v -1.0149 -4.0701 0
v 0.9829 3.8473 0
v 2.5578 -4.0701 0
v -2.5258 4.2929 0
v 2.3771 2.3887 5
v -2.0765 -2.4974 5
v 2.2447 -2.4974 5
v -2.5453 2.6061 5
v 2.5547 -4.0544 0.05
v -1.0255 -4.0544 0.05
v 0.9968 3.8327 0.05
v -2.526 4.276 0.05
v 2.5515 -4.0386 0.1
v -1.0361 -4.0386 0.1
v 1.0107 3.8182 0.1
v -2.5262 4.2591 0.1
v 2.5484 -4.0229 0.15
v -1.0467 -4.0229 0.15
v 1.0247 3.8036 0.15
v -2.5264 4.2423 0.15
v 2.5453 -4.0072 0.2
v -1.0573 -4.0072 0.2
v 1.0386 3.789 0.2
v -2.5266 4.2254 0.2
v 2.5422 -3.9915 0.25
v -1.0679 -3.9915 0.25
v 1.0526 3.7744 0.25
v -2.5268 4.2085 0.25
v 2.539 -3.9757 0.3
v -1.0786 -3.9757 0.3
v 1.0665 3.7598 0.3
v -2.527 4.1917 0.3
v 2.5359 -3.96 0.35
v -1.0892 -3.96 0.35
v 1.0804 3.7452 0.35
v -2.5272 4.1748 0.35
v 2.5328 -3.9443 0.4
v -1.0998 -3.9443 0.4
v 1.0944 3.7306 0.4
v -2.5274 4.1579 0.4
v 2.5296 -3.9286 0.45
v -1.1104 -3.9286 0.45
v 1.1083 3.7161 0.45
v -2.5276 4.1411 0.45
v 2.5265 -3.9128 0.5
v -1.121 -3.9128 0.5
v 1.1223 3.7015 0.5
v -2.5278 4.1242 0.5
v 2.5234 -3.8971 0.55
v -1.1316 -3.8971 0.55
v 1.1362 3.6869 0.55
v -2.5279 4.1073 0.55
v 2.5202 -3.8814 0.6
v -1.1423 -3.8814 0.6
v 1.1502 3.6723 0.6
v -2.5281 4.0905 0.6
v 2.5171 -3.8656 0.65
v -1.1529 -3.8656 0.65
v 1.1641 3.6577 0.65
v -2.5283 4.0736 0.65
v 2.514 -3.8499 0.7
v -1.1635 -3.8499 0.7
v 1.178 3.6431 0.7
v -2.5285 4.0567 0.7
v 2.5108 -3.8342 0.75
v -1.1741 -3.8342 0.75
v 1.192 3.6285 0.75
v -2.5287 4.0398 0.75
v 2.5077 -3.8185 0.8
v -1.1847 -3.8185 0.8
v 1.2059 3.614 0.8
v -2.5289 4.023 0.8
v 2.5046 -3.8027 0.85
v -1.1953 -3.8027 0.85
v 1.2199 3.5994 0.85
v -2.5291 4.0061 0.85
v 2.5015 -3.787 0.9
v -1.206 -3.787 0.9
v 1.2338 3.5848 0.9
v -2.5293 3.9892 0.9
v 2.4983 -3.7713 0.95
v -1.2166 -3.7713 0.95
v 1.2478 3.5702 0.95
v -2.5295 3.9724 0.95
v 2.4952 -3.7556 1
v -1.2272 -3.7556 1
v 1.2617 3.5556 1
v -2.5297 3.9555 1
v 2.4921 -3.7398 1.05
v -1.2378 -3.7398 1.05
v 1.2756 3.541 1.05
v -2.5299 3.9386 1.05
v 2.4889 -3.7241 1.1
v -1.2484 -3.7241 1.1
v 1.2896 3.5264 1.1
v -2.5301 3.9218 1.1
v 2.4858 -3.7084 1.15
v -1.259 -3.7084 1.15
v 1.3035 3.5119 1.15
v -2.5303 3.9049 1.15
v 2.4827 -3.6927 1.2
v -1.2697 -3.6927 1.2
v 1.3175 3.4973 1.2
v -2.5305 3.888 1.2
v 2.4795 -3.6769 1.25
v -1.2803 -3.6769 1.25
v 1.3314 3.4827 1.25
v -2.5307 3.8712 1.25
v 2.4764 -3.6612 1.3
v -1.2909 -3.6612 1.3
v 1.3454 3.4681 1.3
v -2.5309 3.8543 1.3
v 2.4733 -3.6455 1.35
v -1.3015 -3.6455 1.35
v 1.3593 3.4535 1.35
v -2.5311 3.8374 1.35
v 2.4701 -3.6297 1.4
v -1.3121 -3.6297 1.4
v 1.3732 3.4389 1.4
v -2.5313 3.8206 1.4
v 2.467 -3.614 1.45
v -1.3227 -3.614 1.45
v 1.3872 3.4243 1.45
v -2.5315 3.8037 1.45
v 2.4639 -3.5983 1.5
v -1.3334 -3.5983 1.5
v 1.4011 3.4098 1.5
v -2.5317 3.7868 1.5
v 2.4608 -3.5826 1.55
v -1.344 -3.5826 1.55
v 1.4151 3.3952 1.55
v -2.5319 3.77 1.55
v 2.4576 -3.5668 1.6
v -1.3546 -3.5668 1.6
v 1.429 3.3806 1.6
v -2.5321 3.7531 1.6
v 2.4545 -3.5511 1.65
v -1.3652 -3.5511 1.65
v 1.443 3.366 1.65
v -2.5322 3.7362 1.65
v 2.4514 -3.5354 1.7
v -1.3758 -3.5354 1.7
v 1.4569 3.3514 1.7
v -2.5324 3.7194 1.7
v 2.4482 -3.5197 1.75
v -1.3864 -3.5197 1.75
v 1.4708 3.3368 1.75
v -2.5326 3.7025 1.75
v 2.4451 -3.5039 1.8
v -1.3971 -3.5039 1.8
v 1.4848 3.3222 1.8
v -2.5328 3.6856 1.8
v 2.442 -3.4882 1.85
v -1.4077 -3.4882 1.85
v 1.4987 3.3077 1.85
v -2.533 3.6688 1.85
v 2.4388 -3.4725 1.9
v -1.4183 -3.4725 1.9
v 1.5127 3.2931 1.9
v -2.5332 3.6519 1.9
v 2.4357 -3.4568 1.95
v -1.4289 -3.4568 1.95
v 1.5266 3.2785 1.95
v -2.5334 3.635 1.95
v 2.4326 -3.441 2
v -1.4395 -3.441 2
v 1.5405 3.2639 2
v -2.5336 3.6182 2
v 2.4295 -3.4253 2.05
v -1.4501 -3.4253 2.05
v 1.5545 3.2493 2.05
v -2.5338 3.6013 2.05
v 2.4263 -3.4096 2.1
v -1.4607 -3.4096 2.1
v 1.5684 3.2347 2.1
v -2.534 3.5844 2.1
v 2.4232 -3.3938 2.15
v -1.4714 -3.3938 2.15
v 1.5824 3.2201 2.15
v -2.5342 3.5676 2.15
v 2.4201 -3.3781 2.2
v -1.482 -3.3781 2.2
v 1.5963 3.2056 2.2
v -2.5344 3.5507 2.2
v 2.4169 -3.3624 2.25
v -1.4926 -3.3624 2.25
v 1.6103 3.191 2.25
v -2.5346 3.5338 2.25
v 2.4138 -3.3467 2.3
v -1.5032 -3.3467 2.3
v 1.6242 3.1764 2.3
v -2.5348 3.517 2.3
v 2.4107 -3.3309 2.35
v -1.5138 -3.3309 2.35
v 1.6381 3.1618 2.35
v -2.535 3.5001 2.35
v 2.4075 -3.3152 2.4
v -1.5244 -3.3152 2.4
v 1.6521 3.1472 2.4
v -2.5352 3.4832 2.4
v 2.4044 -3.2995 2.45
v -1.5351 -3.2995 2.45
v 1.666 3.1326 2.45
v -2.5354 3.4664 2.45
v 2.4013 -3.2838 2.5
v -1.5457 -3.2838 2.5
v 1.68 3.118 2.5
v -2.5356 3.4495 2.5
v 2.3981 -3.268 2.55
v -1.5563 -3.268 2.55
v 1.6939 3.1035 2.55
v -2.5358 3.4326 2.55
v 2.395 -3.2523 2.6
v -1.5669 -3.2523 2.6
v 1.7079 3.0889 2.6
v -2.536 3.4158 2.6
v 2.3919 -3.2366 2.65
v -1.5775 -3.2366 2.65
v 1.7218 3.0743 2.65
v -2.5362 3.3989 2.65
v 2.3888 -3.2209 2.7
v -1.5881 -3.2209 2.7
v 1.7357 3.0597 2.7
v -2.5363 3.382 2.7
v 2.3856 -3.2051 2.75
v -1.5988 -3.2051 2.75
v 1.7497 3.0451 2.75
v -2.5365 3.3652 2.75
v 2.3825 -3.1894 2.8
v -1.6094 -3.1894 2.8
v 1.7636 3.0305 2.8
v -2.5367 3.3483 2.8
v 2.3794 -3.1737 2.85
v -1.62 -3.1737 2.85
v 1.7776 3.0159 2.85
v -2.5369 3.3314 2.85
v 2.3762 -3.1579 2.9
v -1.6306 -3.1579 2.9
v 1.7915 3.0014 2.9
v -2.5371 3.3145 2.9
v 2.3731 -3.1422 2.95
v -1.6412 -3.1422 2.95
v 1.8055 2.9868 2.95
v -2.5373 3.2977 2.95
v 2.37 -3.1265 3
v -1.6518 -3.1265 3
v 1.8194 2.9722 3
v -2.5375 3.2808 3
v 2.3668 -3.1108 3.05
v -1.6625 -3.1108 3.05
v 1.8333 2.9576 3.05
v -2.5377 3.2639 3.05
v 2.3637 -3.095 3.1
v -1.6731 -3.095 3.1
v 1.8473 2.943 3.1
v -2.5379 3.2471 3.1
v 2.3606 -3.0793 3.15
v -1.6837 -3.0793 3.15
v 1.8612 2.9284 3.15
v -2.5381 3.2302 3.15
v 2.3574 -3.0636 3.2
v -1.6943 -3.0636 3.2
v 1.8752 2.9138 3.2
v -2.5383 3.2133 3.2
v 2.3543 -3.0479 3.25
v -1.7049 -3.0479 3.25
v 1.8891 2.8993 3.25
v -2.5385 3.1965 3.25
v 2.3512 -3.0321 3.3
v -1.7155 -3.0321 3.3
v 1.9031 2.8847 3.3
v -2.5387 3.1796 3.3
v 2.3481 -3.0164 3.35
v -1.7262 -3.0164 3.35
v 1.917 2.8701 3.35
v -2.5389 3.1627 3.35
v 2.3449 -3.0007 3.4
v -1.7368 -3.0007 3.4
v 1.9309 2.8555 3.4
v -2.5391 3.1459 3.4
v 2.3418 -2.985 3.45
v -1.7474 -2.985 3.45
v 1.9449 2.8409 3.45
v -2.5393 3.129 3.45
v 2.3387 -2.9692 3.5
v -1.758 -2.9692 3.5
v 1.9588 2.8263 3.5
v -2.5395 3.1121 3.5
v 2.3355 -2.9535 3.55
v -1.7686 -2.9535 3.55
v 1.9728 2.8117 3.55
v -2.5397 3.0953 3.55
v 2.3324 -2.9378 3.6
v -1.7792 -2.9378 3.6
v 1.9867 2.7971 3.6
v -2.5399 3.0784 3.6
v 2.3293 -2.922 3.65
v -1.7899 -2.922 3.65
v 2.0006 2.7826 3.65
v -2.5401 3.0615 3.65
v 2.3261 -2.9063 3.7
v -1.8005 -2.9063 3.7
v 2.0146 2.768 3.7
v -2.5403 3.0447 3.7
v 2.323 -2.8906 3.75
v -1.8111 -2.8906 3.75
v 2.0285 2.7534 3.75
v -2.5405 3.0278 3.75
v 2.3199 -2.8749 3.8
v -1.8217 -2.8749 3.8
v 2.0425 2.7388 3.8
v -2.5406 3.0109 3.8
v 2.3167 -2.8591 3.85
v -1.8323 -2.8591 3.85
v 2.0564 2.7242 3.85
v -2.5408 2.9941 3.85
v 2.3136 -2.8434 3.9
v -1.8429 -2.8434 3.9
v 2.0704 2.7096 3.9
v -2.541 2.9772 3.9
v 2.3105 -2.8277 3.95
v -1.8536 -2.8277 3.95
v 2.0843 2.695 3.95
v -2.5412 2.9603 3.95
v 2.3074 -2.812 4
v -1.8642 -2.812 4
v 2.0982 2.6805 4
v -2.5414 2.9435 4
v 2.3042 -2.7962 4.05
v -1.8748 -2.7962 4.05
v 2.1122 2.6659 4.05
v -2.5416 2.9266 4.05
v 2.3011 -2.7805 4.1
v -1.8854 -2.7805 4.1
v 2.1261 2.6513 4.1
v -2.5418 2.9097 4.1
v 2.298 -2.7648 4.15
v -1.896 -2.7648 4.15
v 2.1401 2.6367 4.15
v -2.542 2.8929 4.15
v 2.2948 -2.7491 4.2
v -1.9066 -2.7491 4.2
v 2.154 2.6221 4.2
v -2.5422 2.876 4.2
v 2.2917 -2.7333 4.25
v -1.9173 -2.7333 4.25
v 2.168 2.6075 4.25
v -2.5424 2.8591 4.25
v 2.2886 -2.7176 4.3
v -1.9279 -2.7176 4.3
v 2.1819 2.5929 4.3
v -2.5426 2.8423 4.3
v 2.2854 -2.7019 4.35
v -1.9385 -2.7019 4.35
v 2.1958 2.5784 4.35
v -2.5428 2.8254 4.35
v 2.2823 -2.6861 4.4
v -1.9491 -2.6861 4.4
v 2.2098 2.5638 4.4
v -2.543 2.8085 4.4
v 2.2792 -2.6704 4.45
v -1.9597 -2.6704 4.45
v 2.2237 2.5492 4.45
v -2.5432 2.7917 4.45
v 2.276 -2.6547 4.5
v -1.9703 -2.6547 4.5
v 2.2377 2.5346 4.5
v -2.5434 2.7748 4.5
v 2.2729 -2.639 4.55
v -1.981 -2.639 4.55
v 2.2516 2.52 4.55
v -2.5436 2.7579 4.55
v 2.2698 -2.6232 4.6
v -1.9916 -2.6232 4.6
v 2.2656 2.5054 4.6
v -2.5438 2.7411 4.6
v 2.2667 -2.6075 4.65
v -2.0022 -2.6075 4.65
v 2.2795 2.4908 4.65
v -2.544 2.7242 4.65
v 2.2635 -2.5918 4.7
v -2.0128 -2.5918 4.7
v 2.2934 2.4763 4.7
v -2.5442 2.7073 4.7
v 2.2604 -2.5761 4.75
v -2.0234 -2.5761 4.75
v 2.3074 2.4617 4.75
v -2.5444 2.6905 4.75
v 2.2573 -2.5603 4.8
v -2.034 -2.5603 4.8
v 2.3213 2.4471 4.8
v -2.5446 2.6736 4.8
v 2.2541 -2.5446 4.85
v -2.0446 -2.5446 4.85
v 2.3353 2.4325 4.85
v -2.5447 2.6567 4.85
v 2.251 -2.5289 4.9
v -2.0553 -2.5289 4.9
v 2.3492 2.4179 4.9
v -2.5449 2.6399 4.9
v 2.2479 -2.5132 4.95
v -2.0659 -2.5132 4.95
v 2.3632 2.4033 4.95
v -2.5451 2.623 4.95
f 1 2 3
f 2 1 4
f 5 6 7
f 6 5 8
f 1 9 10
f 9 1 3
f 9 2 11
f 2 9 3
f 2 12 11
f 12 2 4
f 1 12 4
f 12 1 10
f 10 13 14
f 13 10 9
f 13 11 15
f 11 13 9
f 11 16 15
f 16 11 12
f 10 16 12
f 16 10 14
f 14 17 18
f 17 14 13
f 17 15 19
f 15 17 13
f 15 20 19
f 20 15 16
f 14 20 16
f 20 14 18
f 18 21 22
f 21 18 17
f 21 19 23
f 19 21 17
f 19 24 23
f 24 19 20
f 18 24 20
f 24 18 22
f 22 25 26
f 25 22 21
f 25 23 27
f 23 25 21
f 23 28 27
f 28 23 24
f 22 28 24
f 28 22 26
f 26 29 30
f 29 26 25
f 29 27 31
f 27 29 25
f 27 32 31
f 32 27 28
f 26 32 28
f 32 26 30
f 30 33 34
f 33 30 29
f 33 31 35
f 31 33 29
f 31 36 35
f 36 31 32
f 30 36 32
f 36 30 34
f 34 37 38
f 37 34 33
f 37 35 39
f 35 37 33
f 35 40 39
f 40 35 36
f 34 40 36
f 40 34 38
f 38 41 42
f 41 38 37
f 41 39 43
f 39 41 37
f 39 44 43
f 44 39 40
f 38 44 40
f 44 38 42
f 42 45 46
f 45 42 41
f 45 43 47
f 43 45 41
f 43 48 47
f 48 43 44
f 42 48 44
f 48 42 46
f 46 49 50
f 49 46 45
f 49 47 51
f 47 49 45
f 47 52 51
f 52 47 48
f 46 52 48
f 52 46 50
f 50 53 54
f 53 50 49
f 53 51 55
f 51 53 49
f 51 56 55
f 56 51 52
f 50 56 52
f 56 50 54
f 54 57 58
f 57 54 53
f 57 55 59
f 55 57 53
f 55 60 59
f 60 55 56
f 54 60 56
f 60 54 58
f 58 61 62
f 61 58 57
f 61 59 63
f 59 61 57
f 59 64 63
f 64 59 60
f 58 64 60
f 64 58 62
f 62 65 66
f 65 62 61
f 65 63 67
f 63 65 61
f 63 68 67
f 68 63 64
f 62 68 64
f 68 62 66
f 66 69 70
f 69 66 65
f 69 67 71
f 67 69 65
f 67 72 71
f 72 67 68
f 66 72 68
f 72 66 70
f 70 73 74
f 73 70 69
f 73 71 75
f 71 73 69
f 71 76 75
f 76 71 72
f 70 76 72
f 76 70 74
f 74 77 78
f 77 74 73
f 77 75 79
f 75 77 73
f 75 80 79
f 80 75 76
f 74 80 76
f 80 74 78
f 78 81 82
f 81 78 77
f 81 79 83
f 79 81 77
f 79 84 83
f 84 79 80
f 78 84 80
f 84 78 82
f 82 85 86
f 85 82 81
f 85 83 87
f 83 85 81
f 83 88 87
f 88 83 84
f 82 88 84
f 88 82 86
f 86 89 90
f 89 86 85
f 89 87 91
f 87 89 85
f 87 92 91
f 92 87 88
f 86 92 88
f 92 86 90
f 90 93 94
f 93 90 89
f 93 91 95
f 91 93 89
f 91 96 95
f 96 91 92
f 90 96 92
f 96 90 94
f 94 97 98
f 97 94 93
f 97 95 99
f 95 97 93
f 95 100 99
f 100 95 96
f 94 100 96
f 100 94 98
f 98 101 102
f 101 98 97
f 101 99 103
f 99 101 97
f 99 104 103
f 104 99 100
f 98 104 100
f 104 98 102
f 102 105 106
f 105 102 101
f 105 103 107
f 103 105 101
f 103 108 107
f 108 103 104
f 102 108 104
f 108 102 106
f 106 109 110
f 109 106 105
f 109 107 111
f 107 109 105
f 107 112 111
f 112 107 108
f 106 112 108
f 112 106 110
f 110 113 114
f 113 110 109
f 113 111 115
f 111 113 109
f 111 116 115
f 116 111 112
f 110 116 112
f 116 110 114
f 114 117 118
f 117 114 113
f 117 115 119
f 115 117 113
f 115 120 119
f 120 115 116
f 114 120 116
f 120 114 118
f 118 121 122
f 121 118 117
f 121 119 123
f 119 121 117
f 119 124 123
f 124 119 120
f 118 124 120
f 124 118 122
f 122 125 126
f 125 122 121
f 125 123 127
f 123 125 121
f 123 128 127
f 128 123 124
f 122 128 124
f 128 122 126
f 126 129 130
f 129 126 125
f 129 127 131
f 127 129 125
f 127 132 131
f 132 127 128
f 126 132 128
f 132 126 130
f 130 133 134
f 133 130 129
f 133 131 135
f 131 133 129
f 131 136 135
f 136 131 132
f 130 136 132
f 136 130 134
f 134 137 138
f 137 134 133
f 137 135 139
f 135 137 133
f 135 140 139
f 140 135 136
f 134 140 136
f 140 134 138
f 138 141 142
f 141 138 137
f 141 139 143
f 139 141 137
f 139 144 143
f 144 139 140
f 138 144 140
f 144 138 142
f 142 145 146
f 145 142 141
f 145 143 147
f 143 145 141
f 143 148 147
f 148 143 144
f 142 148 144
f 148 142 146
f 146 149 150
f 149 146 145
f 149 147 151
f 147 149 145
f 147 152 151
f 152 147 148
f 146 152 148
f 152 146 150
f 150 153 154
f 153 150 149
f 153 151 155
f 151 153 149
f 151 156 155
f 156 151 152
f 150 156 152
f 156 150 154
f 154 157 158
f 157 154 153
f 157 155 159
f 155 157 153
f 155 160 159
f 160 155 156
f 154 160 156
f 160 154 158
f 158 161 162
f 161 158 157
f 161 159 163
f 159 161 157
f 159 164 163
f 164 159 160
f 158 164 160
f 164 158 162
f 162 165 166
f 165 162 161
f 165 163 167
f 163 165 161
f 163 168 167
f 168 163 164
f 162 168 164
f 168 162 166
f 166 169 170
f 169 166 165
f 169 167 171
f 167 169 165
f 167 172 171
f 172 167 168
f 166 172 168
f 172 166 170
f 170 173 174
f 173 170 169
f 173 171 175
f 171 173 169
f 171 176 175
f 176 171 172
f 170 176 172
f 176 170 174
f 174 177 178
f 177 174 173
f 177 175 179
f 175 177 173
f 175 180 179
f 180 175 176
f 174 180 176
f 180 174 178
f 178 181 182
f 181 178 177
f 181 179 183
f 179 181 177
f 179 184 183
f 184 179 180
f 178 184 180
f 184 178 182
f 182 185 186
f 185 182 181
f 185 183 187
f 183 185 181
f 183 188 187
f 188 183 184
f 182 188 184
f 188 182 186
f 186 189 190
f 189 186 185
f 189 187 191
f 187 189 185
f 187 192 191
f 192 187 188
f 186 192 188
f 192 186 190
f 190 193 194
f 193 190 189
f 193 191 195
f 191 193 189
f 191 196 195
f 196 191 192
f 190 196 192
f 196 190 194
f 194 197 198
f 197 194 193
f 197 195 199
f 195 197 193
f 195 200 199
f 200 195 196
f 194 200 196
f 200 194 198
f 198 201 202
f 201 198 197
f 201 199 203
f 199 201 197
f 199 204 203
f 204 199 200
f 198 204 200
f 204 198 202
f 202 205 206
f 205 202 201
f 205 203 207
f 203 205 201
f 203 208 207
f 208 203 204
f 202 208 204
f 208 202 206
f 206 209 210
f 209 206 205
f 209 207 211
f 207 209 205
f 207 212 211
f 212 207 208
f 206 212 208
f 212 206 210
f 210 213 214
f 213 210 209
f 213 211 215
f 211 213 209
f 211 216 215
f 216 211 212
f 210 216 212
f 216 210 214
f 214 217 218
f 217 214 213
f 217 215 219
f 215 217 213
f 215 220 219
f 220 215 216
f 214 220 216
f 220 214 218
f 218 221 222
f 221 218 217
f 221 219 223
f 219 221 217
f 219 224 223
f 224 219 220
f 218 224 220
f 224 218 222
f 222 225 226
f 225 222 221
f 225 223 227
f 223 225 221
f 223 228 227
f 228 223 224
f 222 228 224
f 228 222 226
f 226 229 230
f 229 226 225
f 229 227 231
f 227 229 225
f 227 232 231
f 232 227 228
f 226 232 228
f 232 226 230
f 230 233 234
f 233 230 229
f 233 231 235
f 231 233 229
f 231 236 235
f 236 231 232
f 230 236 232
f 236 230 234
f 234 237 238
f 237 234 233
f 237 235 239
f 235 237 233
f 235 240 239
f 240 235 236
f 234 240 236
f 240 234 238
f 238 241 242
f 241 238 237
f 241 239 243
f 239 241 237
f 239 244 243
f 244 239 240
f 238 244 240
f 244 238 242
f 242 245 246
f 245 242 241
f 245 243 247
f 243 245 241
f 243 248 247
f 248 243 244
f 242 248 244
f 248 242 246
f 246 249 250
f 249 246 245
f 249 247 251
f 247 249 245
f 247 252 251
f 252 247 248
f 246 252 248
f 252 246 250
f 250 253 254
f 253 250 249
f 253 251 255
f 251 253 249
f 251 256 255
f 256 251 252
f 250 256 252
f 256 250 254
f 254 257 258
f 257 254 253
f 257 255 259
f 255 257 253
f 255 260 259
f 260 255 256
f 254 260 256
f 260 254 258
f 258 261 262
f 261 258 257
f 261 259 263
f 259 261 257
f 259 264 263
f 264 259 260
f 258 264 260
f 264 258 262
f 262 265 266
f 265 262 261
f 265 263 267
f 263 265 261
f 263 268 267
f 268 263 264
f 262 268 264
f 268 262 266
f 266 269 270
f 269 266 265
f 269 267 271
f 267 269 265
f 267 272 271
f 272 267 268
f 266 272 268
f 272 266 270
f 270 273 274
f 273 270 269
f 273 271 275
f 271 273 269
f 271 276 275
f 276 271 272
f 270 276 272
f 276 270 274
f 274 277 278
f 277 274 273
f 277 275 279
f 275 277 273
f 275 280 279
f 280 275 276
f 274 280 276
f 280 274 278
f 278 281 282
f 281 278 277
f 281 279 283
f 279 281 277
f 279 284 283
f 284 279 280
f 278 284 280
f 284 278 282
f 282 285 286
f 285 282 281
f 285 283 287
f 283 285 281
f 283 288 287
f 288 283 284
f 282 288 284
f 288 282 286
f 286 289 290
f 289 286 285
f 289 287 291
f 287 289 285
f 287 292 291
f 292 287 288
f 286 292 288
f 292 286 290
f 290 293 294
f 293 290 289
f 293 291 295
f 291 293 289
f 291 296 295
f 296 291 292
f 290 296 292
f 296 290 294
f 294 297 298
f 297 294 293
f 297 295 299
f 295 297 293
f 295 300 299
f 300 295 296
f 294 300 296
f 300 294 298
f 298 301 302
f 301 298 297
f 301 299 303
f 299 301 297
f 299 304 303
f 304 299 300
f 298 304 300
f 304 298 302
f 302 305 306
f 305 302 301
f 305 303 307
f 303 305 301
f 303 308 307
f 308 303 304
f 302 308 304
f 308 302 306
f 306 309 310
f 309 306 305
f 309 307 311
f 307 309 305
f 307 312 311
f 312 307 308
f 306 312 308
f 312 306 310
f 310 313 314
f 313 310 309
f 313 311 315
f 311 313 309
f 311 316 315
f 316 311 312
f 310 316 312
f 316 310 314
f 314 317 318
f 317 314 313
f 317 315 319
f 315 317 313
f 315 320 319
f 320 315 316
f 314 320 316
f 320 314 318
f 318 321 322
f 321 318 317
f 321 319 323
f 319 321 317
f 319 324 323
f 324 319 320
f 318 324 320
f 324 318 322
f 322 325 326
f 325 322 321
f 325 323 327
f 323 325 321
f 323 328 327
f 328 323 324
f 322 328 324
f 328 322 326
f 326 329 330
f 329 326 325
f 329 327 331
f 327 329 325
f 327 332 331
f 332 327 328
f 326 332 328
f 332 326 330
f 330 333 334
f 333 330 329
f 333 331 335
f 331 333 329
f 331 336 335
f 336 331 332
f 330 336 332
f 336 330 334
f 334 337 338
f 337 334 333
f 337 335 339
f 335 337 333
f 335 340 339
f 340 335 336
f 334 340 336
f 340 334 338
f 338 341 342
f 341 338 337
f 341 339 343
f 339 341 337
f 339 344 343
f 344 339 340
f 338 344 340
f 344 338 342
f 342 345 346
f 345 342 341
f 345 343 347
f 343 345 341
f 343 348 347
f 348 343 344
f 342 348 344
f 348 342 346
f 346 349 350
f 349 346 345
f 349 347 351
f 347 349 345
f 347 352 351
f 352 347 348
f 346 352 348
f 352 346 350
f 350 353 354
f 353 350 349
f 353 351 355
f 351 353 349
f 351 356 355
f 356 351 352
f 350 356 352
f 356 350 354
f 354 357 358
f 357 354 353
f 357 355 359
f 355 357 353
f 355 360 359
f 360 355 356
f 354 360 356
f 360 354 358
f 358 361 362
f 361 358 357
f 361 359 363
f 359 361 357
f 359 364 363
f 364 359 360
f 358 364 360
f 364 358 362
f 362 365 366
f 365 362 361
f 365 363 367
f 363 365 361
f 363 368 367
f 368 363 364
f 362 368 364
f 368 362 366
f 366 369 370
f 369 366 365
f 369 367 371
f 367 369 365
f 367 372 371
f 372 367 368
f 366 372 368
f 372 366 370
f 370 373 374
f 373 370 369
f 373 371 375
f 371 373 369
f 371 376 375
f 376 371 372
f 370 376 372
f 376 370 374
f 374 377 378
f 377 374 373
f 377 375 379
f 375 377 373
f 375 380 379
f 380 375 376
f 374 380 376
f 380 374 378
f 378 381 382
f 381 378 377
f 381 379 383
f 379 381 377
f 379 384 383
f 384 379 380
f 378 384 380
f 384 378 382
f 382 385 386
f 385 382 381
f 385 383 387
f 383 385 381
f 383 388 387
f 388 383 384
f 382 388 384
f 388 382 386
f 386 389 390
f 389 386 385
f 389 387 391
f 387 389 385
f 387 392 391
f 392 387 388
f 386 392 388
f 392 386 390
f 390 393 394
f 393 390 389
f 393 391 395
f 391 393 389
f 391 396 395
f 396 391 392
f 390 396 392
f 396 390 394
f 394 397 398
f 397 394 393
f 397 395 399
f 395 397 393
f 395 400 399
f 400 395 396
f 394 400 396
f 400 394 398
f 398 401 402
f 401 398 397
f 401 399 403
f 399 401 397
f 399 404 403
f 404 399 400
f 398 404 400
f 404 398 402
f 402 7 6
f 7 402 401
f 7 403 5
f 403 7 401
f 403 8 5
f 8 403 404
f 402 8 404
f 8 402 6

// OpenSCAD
//  kit wallace random twisted frustrum
// - handle pent to hex transition - just double one of the pentagon points and interpolate
// create mid layer with extra point  ??
// todo - tilt top face 
// todo  - copy one face to the next version - ie the first side of both is given, not random
// also the relative orientation is given

// number of sides 
n=4;
// minimum length of side
min_length=3;
// maximum length of side
max_length=10;
// angle range
angle_range=30;
// height of frustrum
height=5;
//scale upper layer pc
upper_pc=90;
// layers
m=100;


// basic functions
function flatten(l) = [ for (a = l) for (b = a) b ] ;
function between(a,b,x) = x >= a && x <= b;

function depth(a) =
   len(a)== undef 
       ? 0
       : 1 + depth(a[0]);
                
// transformation matrices

function m_translate(v) = [ [1, 0, 0, 0],
                            [0, 1, 0, 0],
                            [0, 0, 1, 0],
                            [v.x, v.y, v.z, 1  ] ];
                            
function m_rotate(v) =  [ [1,  0,         0,        0],
                          [0,  cos(v.x),  sin(v.x), 0],
                          [0, -sin(v.x),  cos(v.x), 0],
                          [0,  0,         0,        1] ]
                      * [ [ cos(v.y), 0,  -sin(v.y), 0],
                          [0,         1,  0,        0],
                          [ sin(v.y), 0,  cos(v.y), 0],
                          [0,         0,  0,        1] ]
                      * [ [ cos(v.z),  sin(v.z), 0, 0],
                          [-sin(v.z),  cos(v.z), 0, 0],
                          [ 0,         0,        1, 0],
                          [ 0,         0,        0, 1] ];
 
function m_scale(v,s) =
     depth(v)==2
      	? [ [v[0],0,0,0],
	        [0,v[1],0,0],
	        [0,0,v[2],0],
	        [0,0,0,1]
          ]
        : [ [v,0,0,0],
	        [0,v,0,0],
	        [0,0,v,0],
	        [0,0,0,1]
          ];
          
function vec3(v) = [v.x, v.y, v.z];
function transform(v, m)  = vec3([v.x, v.y, v.z, 1] * m);

//  angles 

function angle_between(u, v) = 
     let (x= unitv(u) * unitv(v))
     let (y = x <= -1 ? -1 :x >= 1 ? 1 : x)
     let (a = acos(y))
     let (d = cross(u,v).z)
      d  > 0 ? a : 360- a;
               
// vector operations 
function zero(v) =
    len(v) == undef ? 0 : [for (i=[0:len(v)-1]) 0];
   
function slice(v,d,i=0) =
     i < len(v) ?  concat([v[i][d]], slice(v,d,i+1) ) : [] ;
   
function unitv(v)=  v/ norm(v);
   
function v_sum_r(v,n,k) =
      k < n ?  v[k] + v_sum_r(v,n,k+1) : zero(v[0]) ;

function v_sum(v) = v_sum_r(v,len(v),0);
  
function v_avg(v) =v_sum(v) / len(v);
    
function v_centre(v) =  avg(v);
  
function 3d_to_2d(points)=
    [ for (p=points) [p.x,p.y]];
        
function 2d_to_3d(points)=
    [ for (p=points) [p.x,p.y,0]];

function v_scale(v,scale) =
    let(m=m_scale(scale))
    [for (p=v) transform(p,m) ];

function v_rotate(v,angle) =
    let(m=m_rotate([0,0,angle]))
    [for (p=v) transform(p,m)];

function v_translate(v,d) =
    let(m=m_translate(d))
    [for (p=v) transform(p,m)];
  
//  perimeter operations   
//  perimeter is  defined as a sequence of length/interior angle pairs, going anticlockwise 

function peri_to_points(peri,pos=[0,0,0],dir=0,i=0) =
    i == len(peri)
      ? [pos]
      : let(side = peri[i])
        let (distance = side[0])
        let (newpos = pos + distance* [cos(dir), sin(dir),0])
        let (angle = side[1])
        let (newdir = dir + (180 - angle))
        concat([pos],peri_to_points(peri,newpos,newdir,i+1)) 
     ;  
        
function peri_to_tile(peri,last=false) = 
    let (p = peri_to_points(peri))  
    last 
       ? [for (i=[0:len(p)-1]) p[i]] 
       : [for (i=[0:len(p)-2]) p[i]]; 

function total_internal(peri) =
    v_sum(slice(peri,1));

function peri_length(peri) =
    v_sum(slice(peri,0));
            
function isPolygon(peri) =
       let (n = len(peri))
       abs(total_internal(peri) - (n - 2) * 180)<  0.01;
       
function isConvex(peri,i=0) =
   i < len(peri)
     ? peri[i][1] > 0  && peri[i][1] < 180  && peri[i][0] > 0 && isConvex(peri,i+1)
     : true;     


     
// tile operations
    
function tile_to_peri(points) =
    [for (i=[0:len(points)-1])
        let (a = angle_between(
          points[(i+1) % len(points)] - points[i],
          points[(i+2) % len(points)] -  points[(i+1) % len(points)]))
          
       [norm(points[(i+1) % len(points)] - points[i]),
       180-a
       ]
    ] ;

function centre_tile(t) =
    let(c = v_avg(t))
    v_translate(t,-c);
     
// tile to object    
module fill_tile(tile,color="red") {
    color(color)
       polygon(3d_to_2d(tile)); 
};

function random_peri(n,min_length,max_length,min_angle,max_angle) =
   let (p1 =
    [for (i=[0:n-2])
        [rands(min_length,max_length,1)[0], 
         rands(min_angle,max_angle,1)[0]]
    ])
   let(p2 = tile_to_peri(peri_to_tile(p1,true)))  // close the polygon
   let(ln= p2[n-1][0])
   let(an= p2[n-1][1])
   let(an1= p2[n-2][1])
//   isConvex(p2) &&
   isPolygon(p2) &&
           between (min_length,max_length,ln)
       &&  between (min_angle,max_angle,an) 
       &&  between (min_angle,max_angle,an1) 
    
       ? p2
       : random_peri(n,min_length,max_length,min_angle,max_angle)

  ;

function inbetweenh(v1,v2,h,n) =
   len(v1)==len(v2)
   ?
    flatten([for (i=[0:n])
       let(r = i/n)
       flatten([for (j=[0:len(v1)-1])
           let(p1=v1[j])
           let(p2=v2[j])
           [[p1.x *( 1-r) + p2.x*r,
            p1.y *(1-r) + p2.y*r,
            h*r]]
       ])
     ])
    :false;


function inbetween(v1,v2,n) =
   len(v1)==len(v2)
   ?
    flatten([for (i=[0:n])
       let(r = i/n)
       flatten([for (j=[0:len(v1)-1])
           let(p1=v1[j])
           let(p2=v2[j])
           [p1*( 1-r) + p2*r]
       ])
     ])
    :false;
              
// frustrum 
function frustrum_faces(n,m) =
    concat(
     [[for (i=[0:n-1]) i]],            //bottom
     [[for (i=[0:n-1]) n*(m-1) + 2*n - i - 1]],  //top
     flatten([for(j=[0:m-1])
         let(k=j*n)
         [for (i=[0:n-1])                  // sides
         [k+i+n,k+(i+1)%n + n,k+(i+1)%n,k+i ]
         ]
     ])
    );

module loft(bottom,top,n) {
  
vertices=inbetween(bottom,top,m);   
faces= frustrum_faces(len(top),m);
polyhedron(vertices,faces);  
    
}
function triangle(a,b) = norm(cross(a,b))/2;

function tile_area(tile) =
     v_sum([for (i=[0:len(tile)-1])
           triangle(tile[i], tile[(i+1)%len(tile)]) ]);
     
// main    
average_angle=180 - 360/n;
min_angle=max(average_angle - angle_range,1);;
max_angle= min(average_angle +angle_range,179);  
p1=random_peri(n=n,min_length=min_length,max_length=max_length,min_angle=min_angle,max_angle=max_angle); 
t1=centre_tile(peri_to_tile(p1));
// echo(t1);

a1=tile_area(t1);       
p2=random_peri(n=n,min_length=min_length,max_length=max_length,min_angle=min_angle,max_angle=max_angle);    
  
t2=centre_tile(peri_to_tile(p2)); 
// echo(t2);
a2=tile_area(t2);
// echo(a2);
r=1 / sqrt(a2/a1);
// echo(r);
t3=v_scale(t2,r*upper_pc/100); 
// echo(t3);
t3h= v_translate(t3,[0,0,height]);
// echo(t3h);
loft(t1,t3h,m);
